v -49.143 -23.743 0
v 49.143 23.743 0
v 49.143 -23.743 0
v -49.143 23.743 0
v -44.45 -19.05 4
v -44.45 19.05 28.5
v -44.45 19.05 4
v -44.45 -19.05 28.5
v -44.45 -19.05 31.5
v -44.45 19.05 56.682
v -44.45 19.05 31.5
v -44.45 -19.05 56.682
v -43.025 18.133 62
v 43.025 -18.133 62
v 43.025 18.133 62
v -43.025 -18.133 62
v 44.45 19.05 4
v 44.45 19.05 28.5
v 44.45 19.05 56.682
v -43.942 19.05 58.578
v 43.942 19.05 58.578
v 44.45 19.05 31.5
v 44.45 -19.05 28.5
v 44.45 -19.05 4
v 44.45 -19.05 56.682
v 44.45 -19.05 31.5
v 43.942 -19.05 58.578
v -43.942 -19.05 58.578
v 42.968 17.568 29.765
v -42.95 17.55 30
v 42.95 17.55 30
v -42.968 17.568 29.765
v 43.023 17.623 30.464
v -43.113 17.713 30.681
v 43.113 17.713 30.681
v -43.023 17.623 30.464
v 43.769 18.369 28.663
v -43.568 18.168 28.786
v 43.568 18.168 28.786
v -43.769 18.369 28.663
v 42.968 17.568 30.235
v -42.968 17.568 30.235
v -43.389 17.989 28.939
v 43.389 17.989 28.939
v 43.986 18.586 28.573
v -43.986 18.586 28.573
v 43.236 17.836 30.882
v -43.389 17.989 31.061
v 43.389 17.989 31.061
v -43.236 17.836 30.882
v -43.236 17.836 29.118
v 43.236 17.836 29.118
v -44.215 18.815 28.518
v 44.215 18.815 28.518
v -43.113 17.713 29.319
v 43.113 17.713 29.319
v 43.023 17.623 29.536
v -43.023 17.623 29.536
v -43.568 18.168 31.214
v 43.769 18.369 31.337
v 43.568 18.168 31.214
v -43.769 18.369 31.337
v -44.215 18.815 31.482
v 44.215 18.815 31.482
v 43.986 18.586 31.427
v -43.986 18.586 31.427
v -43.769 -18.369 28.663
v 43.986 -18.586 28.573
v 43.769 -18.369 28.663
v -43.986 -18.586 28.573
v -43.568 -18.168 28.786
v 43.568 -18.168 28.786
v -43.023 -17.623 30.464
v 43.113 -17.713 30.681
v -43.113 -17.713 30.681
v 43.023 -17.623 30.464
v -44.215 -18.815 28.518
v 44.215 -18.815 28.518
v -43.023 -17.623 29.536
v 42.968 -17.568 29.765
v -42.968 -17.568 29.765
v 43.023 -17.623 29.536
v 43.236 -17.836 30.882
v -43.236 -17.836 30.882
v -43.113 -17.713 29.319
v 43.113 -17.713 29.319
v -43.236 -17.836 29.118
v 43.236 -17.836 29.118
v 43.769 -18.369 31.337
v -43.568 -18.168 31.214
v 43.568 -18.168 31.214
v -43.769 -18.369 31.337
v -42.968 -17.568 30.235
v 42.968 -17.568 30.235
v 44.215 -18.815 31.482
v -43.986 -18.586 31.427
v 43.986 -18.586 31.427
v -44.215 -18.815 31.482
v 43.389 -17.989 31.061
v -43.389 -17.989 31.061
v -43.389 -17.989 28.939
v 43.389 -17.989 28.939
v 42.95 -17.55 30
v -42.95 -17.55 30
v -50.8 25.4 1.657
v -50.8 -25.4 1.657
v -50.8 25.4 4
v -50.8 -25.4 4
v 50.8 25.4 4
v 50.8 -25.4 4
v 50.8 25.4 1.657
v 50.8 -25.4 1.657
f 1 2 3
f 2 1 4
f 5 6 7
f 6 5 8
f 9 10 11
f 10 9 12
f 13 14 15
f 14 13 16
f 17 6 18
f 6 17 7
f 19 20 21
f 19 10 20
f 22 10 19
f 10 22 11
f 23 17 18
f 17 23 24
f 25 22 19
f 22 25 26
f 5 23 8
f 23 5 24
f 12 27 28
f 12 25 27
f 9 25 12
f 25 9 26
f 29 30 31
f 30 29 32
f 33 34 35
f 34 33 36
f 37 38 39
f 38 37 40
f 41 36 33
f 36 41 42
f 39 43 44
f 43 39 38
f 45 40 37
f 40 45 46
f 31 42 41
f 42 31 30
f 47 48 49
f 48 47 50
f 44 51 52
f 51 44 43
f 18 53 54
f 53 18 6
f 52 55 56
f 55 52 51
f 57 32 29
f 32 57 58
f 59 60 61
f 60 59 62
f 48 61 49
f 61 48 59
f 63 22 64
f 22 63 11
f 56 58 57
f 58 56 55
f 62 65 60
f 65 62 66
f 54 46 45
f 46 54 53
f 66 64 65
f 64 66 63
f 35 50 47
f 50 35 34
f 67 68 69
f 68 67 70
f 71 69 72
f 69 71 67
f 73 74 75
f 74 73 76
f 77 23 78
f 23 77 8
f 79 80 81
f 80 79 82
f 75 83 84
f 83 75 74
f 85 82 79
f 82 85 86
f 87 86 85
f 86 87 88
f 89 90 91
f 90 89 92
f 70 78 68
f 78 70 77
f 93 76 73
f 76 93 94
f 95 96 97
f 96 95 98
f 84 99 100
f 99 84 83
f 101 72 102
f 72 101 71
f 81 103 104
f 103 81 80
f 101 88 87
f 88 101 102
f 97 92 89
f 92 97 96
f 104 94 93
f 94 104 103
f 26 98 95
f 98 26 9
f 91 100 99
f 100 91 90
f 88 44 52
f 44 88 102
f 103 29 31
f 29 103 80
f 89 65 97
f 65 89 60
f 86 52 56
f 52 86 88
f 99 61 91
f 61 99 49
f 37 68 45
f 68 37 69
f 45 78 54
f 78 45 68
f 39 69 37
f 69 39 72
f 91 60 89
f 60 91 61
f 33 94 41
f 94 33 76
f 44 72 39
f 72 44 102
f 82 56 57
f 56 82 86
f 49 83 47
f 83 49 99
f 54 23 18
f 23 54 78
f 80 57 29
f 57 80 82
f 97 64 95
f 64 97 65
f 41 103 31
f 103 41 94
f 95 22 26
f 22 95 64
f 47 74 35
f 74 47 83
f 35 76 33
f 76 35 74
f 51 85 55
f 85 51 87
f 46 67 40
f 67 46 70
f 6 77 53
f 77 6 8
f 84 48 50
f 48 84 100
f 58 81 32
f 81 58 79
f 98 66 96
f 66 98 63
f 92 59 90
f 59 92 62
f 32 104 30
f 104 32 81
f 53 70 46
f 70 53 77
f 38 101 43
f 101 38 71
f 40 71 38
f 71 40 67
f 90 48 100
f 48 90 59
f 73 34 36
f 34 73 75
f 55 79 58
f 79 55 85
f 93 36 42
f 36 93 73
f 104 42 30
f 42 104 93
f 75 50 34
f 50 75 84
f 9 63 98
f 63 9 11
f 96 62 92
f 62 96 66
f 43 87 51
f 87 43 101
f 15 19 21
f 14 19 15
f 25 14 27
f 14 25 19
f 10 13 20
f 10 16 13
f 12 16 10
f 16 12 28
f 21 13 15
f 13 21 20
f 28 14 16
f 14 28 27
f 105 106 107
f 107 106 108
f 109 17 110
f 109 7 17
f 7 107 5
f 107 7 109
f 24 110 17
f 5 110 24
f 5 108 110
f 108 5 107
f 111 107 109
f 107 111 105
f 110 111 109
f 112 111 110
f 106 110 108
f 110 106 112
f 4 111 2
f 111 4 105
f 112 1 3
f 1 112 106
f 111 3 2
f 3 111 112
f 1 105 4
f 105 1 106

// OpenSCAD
$fn = 40;

in_to_cm_ratio = 25.4;
// make an endcap for rectangular aluminum of widthxheight with wall thickness thick_in
module end_cap(width_in=4, height_in=2, thick_in=0.25){
    cap_thick_mm=4;
    insert_depth_mm=60;
    
    internal_width_in = width_in - (2*thick_in);
    internal_height_in = height_in - (2*thick_in);
    
    internal_width_mm = internal_width_in * in_to_cm_ratio;
    internal_height_mm = internal_height_in * in_to_cm_ratio;
    
    external_width_mm = width_in * in_to_cm_ratio;
    external_height_mm = height_in * in_to_cm_ratio;
    echo("width",  external_width_mm, "height", external_height_mm);
    
    // insert
    difference(){
        linear_extrude(insert_depth_mm+(cap_thick_mm/2)){
            square([internal_width_mm, internal_height_mm], center=true);
        }
        // groove
        translate([0, internal_height_mm/2, insert_depth_mm/2]){
            rotate([0,90,0]){
                cylinder(d=3, h=internal_width_mm*2, center=true);
            }
        }
        translate([0, -internal_height_mm/2, insert_depth_mm/2]){
            rotate([0,90,0]){
                cylinder(d=3, h=internal_width_mm*2, center=true);
            }
        }
        translate([internal_width_mm/2, 0, insert_depth_mm/2]){
            rotate([90,90,0]){
                cylinder(d=3, h=internal_height_mm*2, center=true);
            }
        }
        translate([-internal_width_mm/2, 0, insert_depth_mm/2]){
            rotate([90,90,0]){
                cylinder(d=3, h=internal_height_mm*2, center=true);
            }
        }
        // chamfer insert
        translate([(internal_width_mm/2)*.98,0,insert_depth_mm]){
            rotate([0,75,0]){
                linear_extrude(height=4){
                    square([internal_width_mm*2, internal_height_mm], center=true);
                }
            }
        }        
        translate([-(internal_width_mm/2)*.98,0,insert_depth_mm]){
            rotate([0,-75,0]){
                linear_extrude(height=4){
                    square([internal_width_mm*2, internal_height_mm], center=true);
                }
            }
        }        
        translate([0,(internal_height_mm/2)*.98,insert_depth_mm]){
            rotate([-75,0,0]){
                linear_extrude(height=4){
                    square([internal_width_mm, internal_height_mm*2], center=true);
                }
            }
        }        
        translate([0,-(internal_height_mm/2)*.98,insert_depth_mm]){
            rotate([75,0,0]){
                linear_extrude(height=4){
                    square([internal_width_mm, internal_height_mm*2], center=true);
                }
            }
        }        


    }    
    difference(){
        // head
        linear_extrude(height=cap_thick_mm){
            square([external_width_mm, external_height_mm], center=true);
        }
        // chamfer
        translate([0, (external_height_mm/2)+4,0]){
            rotate([45,0,0]){
                linear_extrude(height=4){
                    square([external_width_mm*2, external_height_mm], center=true);
                }
            }
        }
        translate([0, -(external_height_mm/2)-cap_thick_mm,0]){
            rotate([-45,0,0]){
                linear_extrude(height=4){
                    square([external_width_mm*2, external_height_mm], center=true);
                }
            }
        }
        // chamfer ends
        translate([(external_width_mm/2)+cap_thick_mm,0,0]){
            rotate([0,-45,0]){
                linear_extrude(height=4){
                    square([external_width_mm*2, external_height_mm], center=true);
                }
            }
        }
        // chamfer ends
        translate([-(external_width_mm/2)-cap_thick_mm,0,0]){
            rotate([0,45,0]){
                linear_extrude(height=4){
                    square([external_width_mm*2, external_height_mm], center=true);
                }
            }
        }

    }    
}

end_cap();
        
    
